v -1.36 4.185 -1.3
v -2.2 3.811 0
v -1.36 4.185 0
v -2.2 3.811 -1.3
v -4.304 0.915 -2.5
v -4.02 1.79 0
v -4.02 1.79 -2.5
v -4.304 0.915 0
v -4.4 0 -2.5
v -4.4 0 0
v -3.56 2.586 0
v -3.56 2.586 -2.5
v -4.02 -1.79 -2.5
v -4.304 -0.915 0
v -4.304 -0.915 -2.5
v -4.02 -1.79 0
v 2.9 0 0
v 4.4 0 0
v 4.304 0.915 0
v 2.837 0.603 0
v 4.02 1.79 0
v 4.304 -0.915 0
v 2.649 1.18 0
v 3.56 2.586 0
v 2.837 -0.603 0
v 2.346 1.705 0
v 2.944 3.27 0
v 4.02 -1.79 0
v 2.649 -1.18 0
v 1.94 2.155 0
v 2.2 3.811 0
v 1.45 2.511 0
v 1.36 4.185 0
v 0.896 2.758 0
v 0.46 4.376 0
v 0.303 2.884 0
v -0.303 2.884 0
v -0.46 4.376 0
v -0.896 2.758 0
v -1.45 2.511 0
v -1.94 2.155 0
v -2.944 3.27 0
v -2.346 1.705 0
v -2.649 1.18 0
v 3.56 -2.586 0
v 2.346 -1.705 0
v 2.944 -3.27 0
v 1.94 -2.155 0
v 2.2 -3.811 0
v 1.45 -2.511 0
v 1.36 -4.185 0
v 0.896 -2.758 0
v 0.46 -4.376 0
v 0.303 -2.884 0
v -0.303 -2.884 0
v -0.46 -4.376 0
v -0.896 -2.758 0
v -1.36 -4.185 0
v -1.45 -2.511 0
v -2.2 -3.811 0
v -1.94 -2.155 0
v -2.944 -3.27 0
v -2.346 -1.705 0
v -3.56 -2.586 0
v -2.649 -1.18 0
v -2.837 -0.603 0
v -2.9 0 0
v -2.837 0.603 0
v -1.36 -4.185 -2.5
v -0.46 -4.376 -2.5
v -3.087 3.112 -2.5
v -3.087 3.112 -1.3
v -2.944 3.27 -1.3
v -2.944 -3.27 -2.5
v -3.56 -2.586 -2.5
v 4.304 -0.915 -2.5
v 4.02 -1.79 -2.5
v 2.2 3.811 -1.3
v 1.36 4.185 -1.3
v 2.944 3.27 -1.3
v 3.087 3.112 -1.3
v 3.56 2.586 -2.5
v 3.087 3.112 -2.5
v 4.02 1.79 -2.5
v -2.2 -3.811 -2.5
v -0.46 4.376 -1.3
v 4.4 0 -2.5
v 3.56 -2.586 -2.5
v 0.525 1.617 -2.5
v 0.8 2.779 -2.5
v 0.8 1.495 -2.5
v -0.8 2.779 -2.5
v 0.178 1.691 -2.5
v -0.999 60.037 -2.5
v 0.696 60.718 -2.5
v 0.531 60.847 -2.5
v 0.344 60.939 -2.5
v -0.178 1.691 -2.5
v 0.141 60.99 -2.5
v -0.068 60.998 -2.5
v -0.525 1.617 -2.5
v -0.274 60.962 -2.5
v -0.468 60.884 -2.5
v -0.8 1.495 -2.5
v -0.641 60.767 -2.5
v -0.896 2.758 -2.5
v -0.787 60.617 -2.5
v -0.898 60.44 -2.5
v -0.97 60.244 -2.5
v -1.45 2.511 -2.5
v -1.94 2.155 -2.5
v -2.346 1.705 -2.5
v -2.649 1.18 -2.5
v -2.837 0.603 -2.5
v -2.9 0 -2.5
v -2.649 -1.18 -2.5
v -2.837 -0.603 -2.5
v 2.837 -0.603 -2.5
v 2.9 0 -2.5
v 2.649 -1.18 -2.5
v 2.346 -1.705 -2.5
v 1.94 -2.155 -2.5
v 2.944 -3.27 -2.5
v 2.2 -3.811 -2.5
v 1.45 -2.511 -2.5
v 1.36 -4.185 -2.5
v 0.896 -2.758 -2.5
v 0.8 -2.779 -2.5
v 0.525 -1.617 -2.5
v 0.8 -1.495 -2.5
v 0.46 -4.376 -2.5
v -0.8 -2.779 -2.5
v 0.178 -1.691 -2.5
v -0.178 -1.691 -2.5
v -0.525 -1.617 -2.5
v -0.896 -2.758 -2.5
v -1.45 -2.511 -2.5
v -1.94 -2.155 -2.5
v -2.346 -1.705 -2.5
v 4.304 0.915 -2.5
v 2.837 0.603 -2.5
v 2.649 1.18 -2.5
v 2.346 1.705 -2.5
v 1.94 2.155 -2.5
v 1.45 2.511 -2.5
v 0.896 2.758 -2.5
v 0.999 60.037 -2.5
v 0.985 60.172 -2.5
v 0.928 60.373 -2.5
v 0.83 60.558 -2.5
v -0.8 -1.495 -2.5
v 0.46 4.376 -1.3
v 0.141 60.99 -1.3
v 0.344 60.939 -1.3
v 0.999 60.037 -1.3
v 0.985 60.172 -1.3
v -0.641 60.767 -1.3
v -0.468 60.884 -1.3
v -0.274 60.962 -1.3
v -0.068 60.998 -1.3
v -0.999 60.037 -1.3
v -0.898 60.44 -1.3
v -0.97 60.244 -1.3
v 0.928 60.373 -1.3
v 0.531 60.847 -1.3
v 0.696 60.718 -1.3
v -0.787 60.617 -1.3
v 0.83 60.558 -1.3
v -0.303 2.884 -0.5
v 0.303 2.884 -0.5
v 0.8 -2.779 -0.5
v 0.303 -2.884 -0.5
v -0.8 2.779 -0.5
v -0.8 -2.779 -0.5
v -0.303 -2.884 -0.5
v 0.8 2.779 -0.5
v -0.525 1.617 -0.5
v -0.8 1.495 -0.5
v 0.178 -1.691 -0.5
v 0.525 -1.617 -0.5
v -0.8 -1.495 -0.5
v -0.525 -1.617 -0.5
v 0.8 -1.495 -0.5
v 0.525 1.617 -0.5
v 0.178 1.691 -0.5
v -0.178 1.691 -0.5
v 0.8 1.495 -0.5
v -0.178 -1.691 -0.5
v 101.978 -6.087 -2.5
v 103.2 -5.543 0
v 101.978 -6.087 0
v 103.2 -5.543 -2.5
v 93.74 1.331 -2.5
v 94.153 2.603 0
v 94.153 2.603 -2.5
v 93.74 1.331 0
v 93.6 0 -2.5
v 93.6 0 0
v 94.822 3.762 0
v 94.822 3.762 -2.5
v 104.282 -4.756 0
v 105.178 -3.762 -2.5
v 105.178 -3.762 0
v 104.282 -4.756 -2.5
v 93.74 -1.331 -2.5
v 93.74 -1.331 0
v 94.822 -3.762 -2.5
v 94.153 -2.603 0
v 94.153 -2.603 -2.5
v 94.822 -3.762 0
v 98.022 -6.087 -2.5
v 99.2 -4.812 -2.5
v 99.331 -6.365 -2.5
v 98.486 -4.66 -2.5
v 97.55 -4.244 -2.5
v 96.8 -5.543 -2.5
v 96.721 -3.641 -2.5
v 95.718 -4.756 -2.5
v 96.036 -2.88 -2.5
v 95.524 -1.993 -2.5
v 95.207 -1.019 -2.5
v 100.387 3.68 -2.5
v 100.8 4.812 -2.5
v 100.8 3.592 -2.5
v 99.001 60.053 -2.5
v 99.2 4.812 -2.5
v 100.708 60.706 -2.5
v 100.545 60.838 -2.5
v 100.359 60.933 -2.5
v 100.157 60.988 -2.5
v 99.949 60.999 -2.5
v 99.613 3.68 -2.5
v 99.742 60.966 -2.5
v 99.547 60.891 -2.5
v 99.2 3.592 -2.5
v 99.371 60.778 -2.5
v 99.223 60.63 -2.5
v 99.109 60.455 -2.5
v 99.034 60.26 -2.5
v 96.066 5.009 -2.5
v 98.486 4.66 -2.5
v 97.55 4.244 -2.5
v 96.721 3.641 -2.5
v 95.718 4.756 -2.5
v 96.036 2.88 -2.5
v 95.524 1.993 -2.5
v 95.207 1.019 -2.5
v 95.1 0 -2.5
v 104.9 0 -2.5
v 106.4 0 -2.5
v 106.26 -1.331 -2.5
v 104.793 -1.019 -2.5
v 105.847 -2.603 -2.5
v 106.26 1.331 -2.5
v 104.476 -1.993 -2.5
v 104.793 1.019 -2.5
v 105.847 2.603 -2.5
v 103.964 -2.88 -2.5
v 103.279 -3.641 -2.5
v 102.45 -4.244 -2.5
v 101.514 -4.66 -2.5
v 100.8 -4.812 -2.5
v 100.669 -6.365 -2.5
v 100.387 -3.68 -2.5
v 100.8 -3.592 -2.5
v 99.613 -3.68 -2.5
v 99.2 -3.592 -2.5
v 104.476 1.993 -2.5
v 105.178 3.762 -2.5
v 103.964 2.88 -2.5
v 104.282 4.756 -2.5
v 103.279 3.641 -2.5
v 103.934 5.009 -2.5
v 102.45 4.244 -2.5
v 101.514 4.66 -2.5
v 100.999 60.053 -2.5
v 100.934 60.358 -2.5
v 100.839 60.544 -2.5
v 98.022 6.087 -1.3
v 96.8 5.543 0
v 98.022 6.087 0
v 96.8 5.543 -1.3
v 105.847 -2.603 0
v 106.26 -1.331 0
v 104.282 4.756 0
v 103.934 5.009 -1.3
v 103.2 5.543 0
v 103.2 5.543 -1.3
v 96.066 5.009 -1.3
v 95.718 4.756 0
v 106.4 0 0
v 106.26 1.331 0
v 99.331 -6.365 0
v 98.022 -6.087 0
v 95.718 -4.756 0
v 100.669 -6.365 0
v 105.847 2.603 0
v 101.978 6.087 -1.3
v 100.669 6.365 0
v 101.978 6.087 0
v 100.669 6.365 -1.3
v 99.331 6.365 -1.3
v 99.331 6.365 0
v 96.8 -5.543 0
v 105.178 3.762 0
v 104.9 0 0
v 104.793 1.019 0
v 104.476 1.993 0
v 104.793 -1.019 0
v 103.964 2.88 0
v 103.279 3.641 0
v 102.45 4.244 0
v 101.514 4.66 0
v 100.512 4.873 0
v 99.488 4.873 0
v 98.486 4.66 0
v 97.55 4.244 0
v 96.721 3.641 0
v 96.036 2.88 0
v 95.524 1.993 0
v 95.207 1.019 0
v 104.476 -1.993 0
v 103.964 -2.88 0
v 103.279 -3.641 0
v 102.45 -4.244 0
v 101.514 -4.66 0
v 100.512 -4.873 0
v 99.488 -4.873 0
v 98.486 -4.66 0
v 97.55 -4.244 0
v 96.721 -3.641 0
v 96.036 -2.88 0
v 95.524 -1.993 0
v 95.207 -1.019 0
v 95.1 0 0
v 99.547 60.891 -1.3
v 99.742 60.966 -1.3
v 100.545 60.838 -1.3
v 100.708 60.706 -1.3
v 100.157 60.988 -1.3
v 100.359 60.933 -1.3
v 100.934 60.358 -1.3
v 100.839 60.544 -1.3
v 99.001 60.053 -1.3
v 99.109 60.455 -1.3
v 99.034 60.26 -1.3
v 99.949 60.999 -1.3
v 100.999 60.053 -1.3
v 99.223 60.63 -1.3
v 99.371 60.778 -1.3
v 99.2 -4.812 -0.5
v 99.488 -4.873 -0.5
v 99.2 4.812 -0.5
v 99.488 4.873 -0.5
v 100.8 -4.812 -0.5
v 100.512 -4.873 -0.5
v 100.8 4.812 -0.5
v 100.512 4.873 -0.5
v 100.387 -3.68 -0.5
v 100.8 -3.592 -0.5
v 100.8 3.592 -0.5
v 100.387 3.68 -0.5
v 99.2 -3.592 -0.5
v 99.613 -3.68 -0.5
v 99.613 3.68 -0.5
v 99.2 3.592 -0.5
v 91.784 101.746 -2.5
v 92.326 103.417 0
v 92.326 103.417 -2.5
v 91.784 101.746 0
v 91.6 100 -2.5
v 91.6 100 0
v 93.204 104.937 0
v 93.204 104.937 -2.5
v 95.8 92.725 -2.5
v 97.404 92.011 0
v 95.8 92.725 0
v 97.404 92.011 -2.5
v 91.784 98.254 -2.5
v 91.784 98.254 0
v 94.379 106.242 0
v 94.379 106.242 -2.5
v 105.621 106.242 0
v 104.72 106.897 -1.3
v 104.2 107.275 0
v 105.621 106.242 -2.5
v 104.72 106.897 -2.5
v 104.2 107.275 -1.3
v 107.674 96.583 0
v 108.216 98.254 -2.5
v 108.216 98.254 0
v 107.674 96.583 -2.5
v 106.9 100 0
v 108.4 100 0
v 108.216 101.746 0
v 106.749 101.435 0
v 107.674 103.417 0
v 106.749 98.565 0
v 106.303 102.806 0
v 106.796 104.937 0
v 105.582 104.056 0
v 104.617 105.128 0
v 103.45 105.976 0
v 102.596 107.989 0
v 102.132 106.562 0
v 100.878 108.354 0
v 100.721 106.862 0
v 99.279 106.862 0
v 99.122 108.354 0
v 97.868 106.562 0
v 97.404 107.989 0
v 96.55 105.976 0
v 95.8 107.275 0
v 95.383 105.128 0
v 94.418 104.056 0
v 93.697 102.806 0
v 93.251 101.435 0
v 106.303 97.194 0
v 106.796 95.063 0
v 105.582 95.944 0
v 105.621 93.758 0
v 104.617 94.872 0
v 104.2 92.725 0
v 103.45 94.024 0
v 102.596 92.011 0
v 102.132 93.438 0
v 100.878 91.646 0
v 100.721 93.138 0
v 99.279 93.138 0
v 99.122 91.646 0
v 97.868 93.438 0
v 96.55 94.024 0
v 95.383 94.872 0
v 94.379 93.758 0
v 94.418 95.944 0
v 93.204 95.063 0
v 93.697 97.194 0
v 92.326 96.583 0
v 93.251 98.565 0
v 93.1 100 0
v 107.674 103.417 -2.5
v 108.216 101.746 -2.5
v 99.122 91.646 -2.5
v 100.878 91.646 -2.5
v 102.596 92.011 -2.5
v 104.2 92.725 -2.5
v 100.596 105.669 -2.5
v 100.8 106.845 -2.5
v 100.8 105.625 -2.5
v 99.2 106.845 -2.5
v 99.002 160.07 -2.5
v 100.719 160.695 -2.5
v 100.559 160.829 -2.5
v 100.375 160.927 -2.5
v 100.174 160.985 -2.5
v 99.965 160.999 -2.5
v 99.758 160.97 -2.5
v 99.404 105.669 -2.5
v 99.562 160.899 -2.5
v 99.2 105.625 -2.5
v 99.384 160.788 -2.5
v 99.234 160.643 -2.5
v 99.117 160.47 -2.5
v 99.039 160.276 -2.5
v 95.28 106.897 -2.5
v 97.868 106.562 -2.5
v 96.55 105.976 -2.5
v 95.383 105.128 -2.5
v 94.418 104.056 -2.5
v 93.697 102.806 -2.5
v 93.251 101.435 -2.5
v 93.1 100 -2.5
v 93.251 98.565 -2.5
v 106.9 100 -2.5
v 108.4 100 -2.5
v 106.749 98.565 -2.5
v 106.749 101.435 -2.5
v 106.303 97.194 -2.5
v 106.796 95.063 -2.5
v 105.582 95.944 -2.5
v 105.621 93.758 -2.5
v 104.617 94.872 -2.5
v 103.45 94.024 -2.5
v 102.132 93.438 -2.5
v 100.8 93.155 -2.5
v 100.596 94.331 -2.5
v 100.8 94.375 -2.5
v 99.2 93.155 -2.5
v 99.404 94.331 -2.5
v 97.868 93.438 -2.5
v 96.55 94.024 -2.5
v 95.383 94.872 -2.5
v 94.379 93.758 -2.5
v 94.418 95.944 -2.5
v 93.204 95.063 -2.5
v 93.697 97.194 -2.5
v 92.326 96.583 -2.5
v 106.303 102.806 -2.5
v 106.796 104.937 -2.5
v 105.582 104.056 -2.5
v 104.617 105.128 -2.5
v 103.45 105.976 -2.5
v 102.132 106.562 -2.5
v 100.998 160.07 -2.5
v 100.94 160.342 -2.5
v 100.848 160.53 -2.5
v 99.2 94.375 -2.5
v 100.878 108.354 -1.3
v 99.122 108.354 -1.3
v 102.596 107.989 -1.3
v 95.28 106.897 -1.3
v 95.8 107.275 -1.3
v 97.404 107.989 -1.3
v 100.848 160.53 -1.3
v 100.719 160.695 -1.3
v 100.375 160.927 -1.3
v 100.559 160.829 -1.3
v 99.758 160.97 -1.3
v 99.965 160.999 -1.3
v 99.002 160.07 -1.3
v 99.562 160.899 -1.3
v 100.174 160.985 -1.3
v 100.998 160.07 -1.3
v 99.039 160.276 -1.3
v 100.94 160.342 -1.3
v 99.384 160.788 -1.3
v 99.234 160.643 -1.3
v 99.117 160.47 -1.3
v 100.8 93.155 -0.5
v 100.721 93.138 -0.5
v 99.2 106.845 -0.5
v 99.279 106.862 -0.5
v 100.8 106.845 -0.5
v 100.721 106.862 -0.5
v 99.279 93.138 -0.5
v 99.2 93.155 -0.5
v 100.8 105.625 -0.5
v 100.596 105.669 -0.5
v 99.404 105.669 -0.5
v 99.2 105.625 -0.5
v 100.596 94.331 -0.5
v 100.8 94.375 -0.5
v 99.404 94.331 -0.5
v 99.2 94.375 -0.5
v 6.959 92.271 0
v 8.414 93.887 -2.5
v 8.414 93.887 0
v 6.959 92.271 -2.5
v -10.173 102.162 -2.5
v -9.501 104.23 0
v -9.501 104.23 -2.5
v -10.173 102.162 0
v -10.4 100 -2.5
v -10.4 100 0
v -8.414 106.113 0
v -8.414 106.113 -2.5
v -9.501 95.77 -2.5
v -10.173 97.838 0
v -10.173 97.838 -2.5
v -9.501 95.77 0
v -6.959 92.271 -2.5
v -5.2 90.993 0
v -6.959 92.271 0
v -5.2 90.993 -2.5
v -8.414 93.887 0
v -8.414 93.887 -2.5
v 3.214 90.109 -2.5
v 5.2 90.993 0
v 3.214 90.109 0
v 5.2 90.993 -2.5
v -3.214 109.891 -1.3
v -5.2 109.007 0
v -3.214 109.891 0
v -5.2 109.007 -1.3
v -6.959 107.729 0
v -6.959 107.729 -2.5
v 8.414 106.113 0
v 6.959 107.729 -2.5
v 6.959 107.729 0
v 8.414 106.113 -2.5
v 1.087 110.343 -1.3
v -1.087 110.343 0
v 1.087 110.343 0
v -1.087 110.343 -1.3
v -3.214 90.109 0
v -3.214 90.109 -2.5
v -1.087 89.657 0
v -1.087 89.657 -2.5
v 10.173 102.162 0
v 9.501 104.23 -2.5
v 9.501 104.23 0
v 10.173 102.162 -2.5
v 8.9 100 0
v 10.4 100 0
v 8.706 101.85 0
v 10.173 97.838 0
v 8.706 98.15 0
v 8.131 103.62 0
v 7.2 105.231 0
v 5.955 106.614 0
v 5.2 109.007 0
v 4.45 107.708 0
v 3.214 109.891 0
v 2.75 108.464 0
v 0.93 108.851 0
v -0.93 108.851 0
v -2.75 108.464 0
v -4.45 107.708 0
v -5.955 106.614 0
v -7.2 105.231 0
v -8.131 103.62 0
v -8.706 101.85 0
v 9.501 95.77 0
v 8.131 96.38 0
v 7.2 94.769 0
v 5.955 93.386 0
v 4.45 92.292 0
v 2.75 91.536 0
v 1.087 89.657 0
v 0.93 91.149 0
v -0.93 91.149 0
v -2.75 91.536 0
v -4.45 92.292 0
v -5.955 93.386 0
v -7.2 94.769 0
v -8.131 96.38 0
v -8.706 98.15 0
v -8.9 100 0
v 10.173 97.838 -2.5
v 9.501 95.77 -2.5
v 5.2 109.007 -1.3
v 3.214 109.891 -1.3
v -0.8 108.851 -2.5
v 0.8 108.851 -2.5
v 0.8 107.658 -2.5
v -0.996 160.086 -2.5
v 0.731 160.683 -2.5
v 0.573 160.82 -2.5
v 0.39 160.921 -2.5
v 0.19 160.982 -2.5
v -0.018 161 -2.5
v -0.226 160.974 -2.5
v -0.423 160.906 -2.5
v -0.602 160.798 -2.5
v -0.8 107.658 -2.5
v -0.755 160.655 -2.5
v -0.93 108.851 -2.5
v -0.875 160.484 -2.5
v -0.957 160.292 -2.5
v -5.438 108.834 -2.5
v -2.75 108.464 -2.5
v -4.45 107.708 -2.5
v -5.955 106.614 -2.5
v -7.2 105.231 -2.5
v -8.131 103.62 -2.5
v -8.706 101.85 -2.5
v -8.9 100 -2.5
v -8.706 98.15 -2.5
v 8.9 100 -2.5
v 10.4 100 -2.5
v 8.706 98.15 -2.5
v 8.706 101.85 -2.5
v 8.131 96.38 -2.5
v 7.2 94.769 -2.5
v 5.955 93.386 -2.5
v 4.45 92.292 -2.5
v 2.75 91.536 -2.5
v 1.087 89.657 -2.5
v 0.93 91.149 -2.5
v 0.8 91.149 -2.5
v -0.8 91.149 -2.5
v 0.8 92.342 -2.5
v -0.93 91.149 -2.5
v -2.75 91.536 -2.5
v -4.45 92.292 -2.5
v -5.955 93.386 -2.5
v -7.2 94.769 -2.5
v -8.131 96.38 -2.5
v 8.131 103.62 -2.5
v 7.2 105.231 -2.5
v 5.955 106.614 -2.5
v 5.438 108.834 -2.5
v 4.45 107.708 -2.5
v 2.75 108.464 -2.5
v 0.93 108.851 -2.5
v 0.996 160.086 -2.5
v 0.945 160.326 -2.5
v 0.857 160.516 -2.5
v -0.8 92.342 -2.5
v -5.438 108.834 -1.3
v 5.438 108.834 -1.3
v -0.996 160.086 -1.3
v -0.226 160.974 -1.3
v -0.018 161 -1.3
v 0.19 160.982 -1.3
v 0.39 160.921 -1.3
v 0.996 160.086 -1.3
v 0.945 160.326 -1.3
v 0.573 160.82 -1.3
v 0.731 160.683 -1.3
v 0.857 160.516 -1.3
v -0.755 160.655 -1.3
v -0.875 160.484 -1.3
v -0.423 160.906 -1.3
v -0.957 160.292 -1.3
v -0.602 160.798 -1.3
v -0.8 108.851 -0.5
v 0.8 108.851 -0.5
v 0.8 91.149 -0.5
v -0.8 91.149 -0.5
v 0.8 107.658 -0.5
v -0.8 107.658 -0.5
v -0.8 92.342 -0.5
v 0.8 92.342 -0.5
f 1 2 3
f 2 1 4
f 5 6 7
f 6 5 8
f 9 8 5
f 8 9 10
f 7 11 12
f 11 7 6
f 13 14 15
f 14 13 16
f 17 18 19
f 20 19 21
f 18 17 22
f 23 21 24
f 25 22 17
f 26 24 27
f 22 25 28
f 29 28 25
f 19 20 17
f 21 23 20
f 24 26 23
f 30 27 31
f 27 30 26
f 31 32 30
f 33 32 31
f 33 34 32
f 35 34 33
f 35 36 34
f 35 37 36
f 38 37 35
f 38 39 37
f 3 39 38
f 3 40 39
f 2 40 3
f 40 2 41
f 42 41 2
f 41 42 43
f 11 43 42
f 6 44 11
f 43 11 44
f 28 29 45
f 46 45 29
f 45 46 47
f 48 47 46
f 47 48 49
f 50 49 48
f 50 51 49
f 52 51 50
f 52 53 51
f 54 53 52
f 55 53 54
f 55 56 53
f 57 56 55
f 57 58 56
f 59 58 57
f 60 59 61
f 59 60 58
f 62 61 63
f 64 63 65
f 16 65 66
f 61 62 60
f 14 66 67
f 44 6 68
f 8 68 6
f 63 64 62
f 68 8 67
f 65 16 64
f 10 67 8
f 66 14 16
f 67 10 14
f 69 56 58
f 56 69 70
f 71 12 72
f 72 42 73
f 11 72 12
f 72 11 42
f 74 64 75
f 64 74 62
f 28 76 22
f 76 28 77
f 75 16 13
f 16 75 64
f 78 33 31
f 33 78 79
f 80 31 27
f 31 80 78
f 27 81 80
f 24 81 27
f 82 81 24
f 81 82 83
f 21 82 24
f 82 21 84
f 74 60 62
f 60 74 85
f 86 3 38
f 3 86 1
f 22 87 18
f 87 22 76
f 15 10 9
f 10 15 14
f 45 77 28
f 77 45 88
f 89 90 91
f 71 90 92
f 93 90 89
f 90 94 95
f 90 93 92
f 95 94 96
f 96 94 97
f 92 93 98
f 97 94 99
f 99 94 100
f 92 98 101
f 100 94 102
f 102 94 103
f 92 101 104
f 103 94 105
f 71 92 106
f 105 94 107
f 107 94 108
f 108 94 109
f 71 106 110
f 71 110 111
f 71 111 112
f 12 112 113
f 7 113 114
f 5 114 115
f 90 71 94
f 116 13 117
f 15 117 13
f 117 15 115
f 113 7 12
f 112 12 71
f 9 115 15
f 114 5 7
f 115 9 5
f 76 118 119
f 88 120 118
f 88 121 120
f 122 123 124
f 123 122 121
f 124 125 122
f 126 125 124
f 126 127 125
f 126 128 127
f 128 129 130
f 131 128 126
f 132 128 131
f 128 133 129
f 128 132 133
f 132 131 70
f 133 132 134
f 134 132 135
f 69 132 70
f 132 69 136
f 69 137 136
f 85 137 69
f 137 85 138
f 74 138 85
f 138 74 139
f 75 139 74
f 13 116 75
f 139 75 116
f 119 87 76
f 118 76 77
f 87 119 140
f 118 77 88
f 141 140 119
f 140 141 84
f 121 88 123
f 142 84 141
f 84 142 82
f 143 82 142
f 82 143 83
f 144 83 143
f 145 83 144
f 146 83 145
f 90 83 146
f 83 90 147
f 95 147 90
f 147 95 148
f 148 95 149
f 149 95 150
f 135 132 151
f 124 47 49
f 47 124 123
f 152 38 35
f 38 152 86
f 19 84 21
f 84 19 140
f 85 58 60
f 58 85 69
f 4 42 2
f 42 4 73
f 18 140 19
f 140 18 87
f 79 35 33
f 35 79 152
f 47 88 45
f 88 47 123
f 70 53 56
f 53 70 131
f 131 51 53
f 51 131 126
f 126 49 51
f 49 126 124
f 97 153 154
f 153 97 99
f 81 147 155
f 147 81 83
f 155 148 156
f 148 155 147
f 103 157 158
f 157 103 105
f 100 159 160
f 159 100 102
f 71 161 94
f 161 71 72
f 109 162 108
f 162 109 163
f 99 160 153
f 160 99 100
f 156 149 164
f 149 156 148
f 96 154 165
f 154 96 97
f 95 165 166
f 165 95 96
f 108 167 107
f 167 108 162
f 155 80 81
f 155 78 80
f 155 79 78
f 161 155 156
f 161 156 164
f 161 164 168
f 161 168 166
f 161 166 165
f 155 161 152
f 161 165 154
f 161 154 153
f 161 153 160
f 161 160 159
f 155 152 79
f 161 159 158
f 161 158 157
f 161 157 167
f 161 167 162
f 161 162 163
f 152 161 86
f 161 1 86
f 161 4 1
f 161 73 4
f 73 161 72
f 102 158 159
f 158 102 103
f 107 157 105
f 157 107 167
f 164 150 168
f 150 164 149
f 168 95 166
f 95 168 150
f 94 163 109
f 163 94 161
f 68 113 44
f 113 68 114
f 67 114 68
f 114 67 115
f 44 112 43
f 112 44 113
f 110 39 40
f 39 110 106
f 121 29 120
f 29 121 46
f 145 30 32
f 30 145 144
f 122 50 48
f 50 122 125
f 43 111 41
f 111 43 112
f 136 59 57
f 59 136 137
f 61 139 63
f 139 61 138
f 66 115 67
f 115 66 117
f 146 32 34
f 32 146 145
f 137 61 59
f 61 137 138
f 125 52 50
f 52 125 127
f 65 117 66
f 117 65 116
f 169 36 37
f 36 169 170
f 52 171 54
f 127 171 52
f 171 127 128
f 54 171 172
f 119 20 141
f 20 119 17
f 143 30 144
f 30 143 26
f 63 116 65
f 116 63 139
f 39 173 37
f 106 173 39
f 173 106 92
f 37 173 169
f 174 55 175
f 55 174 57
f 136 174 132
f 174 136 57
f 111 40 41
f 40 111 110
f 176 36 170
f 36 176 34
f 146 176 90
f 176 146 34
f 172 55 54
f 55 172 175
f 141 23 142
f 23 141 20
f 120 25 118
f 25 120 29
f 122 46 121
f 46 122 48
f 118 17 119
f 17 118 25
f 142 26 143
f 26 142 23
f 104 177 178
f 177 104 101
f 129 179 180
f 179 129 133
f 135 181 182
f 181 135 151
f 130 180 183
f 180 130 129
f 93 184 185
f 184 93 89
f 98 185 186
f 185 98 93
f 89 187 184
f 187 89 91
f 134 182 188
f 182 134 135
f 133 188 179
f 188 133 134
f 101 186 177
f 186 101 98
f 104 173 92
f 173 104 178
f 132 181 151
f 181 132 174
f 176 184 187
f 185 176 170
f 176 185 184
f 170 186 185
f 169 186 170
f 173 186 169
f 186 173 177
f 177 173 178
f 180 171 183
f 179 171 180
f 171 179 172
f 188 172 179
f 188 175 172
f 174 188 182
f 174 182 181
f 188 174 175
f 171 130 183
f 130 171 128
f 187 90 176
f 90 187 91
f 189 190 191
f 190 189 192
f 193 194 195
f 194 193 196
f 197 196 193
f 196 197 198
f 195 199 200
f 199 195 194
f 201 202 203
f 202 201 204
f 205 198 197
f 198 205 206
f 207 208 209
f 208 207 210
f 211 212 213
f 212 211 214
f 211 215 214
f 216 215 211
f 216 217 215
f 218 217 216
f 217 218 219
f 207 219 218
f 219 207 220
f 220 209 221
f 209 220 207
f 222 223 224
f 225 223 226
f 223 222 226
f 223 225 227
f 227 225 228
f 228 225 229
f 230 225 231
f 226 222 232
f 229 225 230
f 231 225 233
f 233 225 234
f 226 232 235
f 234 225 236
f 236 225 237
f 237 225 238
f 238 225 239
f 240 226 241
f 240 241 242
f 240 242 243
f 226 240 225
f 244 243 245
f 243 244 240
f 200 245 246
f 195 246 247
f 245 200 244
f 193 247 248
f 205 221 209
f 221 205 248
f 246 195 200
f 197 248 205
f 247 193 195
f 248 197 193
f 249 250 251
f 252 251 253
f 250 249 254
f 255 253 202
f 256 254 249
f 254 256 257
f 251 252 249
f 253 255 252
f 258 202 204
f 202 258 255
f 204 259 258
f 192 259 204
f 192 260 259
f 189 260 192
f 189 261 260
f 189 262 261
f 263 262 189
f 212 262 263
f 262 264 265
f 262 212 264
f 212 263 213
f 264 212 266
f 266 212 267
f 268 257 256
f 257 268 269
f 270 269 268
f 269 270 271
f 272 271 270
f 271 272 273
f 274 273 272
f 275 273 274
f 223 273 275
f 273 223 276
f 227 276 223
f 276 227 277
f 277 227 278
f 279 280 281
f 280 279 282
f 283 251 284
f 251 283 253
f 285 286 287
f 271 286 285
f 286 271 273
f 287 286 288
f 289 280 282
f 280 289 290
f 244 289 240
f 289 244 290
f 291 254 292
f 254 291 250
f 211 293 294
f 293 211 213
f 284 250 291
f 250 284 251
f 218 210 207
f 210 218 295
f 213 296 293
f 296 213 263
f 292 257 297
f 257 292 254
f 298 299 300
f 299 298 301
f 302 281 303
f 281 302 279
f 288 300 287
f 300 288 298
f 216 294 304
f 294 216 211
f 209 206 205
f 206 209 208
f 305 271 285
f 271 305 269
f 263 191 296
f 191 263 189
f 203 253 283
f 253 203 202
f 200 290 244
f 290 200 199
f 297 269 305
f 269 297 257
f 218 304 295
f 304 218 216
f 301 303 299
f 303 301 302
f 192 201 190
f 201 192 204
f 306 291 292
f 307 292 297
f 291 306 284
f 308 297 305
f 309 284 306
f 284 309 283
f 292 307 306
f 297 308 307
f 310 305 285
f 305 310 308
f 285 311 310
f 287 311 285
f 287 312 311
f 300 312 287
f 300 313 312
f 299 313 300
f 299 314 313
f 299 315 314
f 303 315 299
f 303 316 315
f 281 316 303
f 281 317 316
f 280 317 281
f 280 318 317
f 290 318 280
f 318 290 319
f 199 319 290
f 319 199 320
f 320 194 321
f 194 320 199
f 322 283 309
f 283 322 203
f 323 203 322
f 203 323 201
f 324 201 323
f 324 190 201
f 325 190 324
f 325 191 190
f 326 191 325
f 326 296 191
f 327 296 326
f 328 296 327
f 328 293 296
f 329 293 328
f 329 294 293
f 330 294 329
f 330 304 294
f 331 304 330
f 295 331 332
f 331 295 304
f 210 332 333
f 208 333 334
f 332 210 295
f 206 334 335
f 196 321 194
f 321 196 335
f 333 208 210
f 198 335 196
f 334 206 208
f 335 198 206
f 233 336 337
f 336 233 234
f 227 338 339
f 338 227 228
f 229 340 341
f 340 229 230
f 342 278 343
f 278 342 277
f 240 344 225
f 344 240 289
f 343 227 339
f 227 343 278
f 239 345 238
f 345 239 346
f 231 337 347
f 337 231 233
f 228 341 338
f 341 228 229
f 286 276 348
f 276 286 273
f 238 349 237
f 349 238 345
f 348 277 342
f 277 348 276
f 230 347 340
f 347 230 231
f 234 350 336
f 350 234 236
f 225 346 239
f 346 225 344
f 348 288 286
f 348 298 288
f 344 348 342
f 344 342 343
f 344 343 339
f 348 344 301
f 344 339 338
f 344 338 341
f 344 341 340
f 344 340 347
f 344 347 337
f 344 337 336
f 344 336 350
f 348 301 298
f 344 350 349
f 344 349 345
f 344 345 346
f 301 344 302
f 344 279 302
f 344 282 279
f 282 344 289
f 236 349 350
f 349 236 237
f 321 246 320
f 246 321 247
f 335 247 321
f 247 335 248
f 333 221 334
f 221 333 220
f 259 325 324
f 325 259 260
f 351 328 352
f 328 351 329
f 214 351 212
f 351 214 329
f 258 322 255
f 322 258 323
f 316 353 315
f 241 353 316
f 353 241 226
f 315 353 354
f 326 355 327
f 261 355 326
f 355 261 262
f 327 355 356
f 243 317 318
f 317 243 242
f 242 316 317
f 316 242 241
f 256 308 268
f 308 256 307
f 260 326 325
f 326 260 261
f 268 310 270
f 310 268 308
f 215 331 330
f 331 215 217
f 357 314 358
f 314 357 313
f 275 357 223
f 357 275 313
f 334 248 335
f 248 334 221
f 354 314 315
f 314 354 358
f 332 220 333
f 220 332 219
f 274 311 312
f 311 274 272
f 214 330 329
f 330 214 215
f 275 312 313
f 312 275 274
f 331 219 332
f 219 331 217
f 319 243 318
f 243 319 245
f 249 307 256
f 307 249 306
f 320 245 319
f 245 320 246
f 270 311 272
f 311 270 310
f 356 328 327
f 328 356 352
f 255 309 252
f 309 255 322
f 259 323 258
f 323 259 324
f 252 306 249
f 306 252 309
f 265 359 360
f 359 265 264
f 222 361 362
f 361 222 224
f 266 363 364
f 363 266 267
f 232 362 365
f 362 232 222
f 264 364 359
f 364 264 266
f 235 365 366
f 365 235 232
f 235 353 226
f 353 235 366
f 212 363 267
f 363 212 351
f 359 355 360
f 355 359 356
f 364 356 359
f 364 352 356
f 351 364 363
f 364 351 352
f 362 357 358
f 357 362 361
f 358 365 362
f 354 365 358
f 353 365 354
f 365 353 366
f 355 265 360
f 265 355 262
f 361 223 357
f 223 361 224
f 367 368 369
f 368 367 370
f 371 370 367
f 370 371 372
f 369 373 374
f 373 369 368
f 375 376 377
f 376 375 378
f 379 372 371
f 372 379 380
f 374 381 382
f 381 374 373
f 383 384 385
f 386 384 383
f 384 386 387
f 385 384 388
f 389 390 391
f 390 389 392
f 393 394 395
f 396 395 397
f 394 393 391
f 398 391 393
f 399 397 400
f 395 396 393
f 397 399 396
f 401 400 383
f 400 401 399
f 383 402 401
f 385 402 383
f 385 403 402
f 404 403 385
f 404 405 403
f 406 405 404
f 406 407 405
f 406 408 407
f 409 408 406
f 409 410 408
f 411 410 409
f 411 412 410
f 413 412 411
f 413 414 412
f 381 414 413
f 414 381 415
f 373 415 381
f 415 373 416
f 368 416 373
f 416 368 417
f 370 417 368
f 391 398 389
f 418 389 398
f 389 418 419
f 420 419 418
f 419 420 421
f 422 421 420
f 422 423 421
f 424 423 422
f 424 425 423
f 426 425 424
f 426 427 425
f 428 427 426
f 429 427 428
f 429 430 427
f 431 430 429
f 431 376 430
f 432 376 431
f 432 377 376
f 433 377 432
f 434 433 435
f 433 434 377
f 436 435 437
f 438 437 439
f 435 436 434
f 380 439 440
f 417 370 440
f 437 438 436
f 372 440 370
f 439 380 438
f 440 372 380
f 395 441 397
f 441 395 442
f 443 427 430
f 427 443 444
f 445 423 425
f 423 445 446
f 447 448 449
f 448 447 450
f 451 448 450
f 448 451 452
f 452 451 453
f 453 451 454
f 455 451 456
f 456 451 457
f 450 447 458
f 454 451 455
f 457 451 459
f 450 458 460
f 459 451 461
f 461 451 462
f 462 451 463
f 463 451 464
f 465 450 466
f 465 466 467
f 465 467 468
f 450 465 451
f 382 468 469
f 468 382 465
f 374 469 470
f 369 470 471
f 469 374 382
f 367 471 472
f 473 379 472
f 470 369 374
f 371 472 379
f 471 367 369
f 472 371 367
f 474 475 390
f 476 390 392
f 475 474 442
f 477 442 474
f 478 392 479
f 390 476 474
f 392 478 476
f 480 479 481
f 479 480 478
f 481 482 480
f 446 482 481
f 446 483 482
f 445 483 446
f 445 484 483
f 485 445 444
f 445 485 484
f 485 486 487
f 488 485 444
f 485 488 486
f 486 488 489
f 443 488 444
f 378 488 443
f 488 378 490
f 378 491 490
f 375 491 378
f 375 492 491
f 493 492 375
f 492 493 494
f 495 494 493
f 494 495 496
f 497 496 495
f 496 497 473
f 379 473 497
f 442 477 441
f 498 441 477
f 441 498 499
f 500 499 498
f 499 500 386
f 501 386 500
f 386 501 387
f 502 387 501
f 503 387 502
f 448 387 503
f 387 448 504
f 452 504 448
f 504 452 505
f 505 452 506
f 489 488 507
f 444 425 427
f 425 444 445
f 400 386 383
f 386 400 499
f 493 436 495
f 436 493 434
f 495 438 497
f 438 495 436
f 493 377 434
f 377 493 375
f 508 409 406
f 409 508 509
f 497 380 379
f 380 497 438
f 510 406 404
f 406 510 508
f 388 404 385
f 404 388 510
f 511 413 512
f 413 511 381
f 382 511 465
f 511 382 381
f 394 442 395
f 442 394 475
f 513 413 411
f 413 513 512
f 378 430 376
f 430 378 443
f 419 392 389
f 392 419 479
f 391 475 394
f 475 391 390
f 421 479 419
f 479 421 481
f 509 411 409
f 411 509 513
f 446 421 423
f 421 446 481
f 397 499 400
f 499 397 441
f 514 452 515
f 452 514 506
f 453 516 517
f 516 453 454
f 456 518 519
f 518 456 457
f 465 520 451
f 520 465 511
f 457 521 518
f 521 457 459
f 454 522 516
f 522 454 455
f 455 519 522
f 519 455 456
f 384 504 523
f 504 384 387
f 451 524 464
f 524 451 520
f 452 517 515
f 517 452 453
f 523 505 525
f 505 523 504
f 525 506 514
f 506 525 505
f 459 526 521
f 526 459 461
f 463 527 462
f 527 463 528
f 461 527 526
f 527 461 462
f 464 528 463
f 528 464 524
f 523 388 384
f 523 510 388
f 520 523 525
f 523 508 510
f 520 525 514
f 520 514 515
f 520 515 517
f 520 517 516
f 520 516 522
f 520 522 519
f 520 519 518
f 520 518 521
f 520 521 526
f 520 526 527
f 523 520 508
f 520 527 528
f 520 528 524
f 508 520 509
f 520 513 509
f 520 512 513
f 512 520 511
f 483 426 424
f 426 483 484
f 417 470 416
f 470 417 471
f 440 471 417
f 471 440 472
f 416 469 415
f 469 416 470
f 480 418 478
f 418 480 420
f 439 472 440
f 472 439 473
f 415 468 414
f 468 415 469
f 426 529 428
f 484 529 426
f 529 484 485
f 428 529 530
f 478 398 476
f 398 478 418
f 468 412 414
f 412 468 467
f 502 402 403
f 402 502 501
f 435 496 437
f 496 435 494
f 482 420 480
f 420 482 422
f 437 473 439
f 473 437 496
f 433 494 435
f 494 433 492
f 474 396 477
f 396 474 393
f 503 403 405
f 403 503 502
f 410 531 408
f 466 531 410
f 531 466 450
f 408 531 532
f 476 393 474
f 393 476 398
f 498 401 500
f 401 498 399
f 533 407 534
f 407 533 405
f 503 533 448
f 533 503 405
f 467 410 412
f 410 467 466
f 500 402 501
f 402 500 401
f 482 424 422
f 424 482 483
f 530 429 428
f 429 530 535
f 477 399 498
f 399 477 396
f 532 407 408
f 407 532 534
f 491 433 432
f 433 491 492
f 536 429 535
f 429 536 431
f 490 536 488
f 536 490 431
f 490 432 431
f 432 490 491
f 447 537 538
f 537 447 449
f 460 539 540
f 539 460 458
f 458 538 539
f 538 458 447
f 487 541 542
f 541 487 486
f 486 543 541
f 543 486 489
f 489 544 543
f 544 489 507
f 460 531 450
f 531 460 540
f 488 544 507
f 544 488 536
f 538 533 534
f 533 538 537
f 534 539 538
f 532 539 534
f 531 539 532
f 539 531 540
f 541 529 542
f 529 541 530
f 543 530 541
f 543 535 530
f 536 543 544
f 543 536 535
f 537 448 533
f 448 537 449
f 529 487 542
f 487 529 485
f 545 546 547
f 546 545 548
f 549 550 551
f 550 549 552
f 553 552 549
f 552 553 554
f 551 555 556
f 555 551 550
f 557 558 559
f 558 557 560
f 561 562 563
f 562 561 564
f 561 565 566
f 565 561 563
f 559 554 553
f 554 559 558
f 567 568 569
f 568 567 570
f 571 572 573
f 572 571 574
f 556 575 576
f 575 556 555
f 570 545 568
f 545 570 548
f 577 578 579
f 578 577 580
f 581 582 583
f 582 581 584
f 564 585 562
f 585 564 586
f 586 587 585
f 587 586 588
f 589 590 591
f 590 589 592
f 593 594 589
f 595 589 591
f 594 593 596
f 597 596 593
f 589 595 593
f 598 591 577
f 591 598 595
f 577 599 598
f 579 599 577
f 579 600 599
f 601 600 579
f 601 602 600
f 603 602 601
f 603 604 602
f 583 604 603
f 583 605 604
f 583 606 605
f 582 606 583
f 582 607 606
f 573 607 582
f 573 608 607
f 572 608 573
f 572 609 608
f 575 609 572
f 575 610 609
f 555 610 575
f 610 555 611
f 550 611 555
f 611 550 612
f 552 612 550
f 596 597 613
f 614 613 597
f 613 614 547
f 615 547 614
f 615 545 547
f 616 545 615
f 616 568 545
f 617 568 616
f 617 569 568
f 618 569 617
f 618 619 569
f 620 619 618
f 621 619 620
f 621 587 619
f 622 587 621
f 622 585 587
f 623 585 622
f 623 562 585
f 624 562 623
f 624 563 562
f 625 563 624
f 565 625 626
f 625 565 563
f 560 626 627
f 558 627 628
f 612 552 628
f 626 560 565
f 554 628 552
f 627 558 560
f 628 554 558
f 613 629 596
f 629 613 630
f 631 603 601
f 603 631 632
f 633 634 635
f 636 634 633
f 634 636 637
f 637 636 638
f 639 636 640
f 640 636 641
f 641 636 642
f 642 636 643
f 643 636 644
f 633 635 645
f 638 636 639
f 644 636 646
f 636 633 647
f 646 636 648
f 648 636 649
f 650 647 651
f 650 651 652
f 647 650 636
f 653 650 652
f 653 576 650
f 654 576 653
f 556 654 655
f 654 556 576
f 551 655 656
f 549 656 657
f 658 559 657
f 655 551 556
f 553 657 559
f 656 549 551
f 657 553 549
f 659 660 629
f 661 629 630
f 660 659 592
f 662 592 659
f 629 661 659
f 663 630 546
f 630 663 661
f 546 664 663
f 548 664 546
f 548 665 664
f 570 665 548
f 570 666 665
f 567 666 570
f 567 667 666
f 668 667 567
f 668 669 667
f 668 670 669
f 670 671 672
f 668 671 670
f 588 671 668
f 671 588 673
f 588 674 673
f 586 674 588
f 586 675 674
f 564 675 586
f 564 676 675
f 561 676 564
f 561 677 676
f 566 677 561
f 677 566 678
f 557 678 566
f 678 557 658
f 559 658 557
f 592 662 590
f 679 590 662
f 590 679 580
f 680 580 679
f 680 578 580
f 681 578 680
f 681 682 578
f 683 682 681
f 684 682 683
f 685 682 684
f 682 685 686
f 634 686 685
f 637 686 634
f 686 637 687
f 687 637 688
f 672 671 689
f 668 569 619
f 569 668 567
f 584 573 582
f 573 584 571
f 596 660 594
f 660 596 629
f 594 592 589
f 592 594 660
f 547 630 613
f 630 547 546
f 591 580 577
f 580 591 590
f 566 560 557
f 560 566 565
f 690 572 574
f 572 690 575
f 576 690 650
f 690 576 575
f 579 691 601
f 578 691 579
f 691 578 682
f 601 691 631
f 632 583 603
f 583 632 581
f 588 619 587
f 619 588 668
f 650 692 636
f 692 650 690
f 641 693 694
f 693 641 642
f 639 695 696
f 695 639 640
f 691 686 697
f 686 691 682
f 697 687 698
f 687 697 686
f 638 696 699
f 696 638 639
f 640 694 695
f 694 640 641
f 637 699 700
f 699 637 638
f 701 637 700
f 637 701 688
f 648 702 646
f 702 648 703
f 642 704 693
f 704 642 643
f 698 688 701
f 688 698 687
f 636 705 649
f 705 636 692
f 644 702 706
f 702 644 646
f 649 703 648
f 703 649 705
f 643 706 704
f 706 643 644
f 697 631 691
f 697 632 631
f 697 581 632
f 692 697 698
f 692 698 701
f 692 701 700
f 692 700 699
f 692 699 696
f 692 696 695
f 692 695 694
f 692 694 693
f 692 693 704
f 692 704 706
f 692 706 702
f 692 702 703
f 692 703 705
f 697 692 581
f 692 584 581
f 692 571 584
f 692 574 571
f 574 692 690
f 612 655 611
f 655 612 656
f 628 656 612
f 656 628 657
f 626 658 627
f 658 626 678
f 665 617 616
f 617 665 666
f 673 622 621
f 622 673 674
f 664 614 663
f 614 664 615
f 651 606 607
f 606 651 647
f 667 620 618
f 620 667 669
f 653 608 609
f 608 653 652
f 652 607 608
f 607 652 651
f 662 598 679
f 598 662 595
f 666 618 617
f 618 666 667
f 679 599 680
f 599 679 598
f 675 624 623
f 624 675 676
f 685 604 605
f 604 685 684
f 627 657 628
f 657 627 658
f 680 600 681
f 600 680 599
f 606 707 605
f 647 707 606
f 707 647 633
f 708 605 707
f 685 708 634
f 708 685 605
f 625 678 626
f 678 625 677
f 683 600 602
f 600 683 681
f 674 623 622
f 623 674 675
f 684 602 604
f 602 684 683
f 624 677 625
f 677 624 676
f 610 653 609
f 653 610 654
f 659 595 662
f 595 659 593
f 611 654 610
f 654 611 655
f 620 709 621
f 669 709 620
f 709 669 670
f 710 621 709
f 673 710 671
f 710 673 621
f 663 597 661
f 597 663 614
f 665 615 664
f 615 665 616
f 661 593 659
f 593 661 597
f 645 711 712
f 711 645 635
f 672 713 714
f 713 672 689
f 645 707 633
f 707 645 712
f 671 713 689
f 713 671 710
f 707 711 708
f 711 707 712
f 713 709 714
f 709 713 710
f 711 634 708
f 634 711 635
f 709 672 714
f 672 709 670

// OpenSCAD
//////////////////////////////////////////////////////////////////////////////////////////////
module shaft (
gear = 1
)
{
    
    collaHeightOffset = 0;
    collaDiamater = 10;
    gearHeight = 3;
    keyWidth = 1.6;
    keyHeight = 2;
    collaWidth = 1.2;
    gearDiamater = 35;

    collaSpacing = 2.0;
    
    bushingDi = 12;
    
    collaDiamater = 2.4 + ((gear -1)  * 2);
    colla2Diamater = 2.4 + ((gear )  * 2);
    
    collaHeight = 2.5 ;
    bushingHeight = 2;
    tabHeight  = collaHeightOffset - gearHeight;
    innerCollaDiamater = (collaDiamater - collaWidth) +0.5 ;
    tabHeight =  (collaHeight / 30) + gearHeight * gear ;
innerCollaHeight = collaHeight * 3;
handLength = 60;
 
rotate([0,180,0]){
    difference() {
        //hand shape in here
        union(){
        cylinder(collaHeight, colla2Diamater, colla2Diamater, false);
        translate([0,0,collaHeight - 1.2])    {
 linear_extrude(1.2){
     offset(1){
    polygon([
        [colla2Diamater /2,0],
        
        [-(colla2Diamater /2),0],
        [0, handLength]
        
        ],1);
 }
 }
 }
        }

    union(){
    difference() {
        difference() {
            union(){
                
                cylinder(collaHeight, collaDiamater + 0.5, collaDiamater + 0.5, false);
            }    
            cylinder(innerCollaHeight, innerCollaDiamater, innerCollaDiamater, true);
        }
        translate([0,0,(collaHeight - (keyHeight / 2) +1)]) {
            cube([keyWidth,(collaDiamater * 2) + 2, keyHeight + 2], true);
        }
    }
            cylinder(collaHeight, innerCollaDiamater, innerCollaDiamater, false);
}
}
}
}
$fs = 0.01;

stack = 0;

if(stack == 1){
    shaft(1);
    translate([0,0,3.5]){shaft(2 ); }
    translate([0,0,7]){shaft(3); }
    translate([0,0,10.5]){shaft(4); }
}else{
    shaft(1);
    translate([100,0,0]){shaft(2); }
    translate([100,100,0]){shaft(3); }
    translate([0,100,00]){shaft(4); }
}
